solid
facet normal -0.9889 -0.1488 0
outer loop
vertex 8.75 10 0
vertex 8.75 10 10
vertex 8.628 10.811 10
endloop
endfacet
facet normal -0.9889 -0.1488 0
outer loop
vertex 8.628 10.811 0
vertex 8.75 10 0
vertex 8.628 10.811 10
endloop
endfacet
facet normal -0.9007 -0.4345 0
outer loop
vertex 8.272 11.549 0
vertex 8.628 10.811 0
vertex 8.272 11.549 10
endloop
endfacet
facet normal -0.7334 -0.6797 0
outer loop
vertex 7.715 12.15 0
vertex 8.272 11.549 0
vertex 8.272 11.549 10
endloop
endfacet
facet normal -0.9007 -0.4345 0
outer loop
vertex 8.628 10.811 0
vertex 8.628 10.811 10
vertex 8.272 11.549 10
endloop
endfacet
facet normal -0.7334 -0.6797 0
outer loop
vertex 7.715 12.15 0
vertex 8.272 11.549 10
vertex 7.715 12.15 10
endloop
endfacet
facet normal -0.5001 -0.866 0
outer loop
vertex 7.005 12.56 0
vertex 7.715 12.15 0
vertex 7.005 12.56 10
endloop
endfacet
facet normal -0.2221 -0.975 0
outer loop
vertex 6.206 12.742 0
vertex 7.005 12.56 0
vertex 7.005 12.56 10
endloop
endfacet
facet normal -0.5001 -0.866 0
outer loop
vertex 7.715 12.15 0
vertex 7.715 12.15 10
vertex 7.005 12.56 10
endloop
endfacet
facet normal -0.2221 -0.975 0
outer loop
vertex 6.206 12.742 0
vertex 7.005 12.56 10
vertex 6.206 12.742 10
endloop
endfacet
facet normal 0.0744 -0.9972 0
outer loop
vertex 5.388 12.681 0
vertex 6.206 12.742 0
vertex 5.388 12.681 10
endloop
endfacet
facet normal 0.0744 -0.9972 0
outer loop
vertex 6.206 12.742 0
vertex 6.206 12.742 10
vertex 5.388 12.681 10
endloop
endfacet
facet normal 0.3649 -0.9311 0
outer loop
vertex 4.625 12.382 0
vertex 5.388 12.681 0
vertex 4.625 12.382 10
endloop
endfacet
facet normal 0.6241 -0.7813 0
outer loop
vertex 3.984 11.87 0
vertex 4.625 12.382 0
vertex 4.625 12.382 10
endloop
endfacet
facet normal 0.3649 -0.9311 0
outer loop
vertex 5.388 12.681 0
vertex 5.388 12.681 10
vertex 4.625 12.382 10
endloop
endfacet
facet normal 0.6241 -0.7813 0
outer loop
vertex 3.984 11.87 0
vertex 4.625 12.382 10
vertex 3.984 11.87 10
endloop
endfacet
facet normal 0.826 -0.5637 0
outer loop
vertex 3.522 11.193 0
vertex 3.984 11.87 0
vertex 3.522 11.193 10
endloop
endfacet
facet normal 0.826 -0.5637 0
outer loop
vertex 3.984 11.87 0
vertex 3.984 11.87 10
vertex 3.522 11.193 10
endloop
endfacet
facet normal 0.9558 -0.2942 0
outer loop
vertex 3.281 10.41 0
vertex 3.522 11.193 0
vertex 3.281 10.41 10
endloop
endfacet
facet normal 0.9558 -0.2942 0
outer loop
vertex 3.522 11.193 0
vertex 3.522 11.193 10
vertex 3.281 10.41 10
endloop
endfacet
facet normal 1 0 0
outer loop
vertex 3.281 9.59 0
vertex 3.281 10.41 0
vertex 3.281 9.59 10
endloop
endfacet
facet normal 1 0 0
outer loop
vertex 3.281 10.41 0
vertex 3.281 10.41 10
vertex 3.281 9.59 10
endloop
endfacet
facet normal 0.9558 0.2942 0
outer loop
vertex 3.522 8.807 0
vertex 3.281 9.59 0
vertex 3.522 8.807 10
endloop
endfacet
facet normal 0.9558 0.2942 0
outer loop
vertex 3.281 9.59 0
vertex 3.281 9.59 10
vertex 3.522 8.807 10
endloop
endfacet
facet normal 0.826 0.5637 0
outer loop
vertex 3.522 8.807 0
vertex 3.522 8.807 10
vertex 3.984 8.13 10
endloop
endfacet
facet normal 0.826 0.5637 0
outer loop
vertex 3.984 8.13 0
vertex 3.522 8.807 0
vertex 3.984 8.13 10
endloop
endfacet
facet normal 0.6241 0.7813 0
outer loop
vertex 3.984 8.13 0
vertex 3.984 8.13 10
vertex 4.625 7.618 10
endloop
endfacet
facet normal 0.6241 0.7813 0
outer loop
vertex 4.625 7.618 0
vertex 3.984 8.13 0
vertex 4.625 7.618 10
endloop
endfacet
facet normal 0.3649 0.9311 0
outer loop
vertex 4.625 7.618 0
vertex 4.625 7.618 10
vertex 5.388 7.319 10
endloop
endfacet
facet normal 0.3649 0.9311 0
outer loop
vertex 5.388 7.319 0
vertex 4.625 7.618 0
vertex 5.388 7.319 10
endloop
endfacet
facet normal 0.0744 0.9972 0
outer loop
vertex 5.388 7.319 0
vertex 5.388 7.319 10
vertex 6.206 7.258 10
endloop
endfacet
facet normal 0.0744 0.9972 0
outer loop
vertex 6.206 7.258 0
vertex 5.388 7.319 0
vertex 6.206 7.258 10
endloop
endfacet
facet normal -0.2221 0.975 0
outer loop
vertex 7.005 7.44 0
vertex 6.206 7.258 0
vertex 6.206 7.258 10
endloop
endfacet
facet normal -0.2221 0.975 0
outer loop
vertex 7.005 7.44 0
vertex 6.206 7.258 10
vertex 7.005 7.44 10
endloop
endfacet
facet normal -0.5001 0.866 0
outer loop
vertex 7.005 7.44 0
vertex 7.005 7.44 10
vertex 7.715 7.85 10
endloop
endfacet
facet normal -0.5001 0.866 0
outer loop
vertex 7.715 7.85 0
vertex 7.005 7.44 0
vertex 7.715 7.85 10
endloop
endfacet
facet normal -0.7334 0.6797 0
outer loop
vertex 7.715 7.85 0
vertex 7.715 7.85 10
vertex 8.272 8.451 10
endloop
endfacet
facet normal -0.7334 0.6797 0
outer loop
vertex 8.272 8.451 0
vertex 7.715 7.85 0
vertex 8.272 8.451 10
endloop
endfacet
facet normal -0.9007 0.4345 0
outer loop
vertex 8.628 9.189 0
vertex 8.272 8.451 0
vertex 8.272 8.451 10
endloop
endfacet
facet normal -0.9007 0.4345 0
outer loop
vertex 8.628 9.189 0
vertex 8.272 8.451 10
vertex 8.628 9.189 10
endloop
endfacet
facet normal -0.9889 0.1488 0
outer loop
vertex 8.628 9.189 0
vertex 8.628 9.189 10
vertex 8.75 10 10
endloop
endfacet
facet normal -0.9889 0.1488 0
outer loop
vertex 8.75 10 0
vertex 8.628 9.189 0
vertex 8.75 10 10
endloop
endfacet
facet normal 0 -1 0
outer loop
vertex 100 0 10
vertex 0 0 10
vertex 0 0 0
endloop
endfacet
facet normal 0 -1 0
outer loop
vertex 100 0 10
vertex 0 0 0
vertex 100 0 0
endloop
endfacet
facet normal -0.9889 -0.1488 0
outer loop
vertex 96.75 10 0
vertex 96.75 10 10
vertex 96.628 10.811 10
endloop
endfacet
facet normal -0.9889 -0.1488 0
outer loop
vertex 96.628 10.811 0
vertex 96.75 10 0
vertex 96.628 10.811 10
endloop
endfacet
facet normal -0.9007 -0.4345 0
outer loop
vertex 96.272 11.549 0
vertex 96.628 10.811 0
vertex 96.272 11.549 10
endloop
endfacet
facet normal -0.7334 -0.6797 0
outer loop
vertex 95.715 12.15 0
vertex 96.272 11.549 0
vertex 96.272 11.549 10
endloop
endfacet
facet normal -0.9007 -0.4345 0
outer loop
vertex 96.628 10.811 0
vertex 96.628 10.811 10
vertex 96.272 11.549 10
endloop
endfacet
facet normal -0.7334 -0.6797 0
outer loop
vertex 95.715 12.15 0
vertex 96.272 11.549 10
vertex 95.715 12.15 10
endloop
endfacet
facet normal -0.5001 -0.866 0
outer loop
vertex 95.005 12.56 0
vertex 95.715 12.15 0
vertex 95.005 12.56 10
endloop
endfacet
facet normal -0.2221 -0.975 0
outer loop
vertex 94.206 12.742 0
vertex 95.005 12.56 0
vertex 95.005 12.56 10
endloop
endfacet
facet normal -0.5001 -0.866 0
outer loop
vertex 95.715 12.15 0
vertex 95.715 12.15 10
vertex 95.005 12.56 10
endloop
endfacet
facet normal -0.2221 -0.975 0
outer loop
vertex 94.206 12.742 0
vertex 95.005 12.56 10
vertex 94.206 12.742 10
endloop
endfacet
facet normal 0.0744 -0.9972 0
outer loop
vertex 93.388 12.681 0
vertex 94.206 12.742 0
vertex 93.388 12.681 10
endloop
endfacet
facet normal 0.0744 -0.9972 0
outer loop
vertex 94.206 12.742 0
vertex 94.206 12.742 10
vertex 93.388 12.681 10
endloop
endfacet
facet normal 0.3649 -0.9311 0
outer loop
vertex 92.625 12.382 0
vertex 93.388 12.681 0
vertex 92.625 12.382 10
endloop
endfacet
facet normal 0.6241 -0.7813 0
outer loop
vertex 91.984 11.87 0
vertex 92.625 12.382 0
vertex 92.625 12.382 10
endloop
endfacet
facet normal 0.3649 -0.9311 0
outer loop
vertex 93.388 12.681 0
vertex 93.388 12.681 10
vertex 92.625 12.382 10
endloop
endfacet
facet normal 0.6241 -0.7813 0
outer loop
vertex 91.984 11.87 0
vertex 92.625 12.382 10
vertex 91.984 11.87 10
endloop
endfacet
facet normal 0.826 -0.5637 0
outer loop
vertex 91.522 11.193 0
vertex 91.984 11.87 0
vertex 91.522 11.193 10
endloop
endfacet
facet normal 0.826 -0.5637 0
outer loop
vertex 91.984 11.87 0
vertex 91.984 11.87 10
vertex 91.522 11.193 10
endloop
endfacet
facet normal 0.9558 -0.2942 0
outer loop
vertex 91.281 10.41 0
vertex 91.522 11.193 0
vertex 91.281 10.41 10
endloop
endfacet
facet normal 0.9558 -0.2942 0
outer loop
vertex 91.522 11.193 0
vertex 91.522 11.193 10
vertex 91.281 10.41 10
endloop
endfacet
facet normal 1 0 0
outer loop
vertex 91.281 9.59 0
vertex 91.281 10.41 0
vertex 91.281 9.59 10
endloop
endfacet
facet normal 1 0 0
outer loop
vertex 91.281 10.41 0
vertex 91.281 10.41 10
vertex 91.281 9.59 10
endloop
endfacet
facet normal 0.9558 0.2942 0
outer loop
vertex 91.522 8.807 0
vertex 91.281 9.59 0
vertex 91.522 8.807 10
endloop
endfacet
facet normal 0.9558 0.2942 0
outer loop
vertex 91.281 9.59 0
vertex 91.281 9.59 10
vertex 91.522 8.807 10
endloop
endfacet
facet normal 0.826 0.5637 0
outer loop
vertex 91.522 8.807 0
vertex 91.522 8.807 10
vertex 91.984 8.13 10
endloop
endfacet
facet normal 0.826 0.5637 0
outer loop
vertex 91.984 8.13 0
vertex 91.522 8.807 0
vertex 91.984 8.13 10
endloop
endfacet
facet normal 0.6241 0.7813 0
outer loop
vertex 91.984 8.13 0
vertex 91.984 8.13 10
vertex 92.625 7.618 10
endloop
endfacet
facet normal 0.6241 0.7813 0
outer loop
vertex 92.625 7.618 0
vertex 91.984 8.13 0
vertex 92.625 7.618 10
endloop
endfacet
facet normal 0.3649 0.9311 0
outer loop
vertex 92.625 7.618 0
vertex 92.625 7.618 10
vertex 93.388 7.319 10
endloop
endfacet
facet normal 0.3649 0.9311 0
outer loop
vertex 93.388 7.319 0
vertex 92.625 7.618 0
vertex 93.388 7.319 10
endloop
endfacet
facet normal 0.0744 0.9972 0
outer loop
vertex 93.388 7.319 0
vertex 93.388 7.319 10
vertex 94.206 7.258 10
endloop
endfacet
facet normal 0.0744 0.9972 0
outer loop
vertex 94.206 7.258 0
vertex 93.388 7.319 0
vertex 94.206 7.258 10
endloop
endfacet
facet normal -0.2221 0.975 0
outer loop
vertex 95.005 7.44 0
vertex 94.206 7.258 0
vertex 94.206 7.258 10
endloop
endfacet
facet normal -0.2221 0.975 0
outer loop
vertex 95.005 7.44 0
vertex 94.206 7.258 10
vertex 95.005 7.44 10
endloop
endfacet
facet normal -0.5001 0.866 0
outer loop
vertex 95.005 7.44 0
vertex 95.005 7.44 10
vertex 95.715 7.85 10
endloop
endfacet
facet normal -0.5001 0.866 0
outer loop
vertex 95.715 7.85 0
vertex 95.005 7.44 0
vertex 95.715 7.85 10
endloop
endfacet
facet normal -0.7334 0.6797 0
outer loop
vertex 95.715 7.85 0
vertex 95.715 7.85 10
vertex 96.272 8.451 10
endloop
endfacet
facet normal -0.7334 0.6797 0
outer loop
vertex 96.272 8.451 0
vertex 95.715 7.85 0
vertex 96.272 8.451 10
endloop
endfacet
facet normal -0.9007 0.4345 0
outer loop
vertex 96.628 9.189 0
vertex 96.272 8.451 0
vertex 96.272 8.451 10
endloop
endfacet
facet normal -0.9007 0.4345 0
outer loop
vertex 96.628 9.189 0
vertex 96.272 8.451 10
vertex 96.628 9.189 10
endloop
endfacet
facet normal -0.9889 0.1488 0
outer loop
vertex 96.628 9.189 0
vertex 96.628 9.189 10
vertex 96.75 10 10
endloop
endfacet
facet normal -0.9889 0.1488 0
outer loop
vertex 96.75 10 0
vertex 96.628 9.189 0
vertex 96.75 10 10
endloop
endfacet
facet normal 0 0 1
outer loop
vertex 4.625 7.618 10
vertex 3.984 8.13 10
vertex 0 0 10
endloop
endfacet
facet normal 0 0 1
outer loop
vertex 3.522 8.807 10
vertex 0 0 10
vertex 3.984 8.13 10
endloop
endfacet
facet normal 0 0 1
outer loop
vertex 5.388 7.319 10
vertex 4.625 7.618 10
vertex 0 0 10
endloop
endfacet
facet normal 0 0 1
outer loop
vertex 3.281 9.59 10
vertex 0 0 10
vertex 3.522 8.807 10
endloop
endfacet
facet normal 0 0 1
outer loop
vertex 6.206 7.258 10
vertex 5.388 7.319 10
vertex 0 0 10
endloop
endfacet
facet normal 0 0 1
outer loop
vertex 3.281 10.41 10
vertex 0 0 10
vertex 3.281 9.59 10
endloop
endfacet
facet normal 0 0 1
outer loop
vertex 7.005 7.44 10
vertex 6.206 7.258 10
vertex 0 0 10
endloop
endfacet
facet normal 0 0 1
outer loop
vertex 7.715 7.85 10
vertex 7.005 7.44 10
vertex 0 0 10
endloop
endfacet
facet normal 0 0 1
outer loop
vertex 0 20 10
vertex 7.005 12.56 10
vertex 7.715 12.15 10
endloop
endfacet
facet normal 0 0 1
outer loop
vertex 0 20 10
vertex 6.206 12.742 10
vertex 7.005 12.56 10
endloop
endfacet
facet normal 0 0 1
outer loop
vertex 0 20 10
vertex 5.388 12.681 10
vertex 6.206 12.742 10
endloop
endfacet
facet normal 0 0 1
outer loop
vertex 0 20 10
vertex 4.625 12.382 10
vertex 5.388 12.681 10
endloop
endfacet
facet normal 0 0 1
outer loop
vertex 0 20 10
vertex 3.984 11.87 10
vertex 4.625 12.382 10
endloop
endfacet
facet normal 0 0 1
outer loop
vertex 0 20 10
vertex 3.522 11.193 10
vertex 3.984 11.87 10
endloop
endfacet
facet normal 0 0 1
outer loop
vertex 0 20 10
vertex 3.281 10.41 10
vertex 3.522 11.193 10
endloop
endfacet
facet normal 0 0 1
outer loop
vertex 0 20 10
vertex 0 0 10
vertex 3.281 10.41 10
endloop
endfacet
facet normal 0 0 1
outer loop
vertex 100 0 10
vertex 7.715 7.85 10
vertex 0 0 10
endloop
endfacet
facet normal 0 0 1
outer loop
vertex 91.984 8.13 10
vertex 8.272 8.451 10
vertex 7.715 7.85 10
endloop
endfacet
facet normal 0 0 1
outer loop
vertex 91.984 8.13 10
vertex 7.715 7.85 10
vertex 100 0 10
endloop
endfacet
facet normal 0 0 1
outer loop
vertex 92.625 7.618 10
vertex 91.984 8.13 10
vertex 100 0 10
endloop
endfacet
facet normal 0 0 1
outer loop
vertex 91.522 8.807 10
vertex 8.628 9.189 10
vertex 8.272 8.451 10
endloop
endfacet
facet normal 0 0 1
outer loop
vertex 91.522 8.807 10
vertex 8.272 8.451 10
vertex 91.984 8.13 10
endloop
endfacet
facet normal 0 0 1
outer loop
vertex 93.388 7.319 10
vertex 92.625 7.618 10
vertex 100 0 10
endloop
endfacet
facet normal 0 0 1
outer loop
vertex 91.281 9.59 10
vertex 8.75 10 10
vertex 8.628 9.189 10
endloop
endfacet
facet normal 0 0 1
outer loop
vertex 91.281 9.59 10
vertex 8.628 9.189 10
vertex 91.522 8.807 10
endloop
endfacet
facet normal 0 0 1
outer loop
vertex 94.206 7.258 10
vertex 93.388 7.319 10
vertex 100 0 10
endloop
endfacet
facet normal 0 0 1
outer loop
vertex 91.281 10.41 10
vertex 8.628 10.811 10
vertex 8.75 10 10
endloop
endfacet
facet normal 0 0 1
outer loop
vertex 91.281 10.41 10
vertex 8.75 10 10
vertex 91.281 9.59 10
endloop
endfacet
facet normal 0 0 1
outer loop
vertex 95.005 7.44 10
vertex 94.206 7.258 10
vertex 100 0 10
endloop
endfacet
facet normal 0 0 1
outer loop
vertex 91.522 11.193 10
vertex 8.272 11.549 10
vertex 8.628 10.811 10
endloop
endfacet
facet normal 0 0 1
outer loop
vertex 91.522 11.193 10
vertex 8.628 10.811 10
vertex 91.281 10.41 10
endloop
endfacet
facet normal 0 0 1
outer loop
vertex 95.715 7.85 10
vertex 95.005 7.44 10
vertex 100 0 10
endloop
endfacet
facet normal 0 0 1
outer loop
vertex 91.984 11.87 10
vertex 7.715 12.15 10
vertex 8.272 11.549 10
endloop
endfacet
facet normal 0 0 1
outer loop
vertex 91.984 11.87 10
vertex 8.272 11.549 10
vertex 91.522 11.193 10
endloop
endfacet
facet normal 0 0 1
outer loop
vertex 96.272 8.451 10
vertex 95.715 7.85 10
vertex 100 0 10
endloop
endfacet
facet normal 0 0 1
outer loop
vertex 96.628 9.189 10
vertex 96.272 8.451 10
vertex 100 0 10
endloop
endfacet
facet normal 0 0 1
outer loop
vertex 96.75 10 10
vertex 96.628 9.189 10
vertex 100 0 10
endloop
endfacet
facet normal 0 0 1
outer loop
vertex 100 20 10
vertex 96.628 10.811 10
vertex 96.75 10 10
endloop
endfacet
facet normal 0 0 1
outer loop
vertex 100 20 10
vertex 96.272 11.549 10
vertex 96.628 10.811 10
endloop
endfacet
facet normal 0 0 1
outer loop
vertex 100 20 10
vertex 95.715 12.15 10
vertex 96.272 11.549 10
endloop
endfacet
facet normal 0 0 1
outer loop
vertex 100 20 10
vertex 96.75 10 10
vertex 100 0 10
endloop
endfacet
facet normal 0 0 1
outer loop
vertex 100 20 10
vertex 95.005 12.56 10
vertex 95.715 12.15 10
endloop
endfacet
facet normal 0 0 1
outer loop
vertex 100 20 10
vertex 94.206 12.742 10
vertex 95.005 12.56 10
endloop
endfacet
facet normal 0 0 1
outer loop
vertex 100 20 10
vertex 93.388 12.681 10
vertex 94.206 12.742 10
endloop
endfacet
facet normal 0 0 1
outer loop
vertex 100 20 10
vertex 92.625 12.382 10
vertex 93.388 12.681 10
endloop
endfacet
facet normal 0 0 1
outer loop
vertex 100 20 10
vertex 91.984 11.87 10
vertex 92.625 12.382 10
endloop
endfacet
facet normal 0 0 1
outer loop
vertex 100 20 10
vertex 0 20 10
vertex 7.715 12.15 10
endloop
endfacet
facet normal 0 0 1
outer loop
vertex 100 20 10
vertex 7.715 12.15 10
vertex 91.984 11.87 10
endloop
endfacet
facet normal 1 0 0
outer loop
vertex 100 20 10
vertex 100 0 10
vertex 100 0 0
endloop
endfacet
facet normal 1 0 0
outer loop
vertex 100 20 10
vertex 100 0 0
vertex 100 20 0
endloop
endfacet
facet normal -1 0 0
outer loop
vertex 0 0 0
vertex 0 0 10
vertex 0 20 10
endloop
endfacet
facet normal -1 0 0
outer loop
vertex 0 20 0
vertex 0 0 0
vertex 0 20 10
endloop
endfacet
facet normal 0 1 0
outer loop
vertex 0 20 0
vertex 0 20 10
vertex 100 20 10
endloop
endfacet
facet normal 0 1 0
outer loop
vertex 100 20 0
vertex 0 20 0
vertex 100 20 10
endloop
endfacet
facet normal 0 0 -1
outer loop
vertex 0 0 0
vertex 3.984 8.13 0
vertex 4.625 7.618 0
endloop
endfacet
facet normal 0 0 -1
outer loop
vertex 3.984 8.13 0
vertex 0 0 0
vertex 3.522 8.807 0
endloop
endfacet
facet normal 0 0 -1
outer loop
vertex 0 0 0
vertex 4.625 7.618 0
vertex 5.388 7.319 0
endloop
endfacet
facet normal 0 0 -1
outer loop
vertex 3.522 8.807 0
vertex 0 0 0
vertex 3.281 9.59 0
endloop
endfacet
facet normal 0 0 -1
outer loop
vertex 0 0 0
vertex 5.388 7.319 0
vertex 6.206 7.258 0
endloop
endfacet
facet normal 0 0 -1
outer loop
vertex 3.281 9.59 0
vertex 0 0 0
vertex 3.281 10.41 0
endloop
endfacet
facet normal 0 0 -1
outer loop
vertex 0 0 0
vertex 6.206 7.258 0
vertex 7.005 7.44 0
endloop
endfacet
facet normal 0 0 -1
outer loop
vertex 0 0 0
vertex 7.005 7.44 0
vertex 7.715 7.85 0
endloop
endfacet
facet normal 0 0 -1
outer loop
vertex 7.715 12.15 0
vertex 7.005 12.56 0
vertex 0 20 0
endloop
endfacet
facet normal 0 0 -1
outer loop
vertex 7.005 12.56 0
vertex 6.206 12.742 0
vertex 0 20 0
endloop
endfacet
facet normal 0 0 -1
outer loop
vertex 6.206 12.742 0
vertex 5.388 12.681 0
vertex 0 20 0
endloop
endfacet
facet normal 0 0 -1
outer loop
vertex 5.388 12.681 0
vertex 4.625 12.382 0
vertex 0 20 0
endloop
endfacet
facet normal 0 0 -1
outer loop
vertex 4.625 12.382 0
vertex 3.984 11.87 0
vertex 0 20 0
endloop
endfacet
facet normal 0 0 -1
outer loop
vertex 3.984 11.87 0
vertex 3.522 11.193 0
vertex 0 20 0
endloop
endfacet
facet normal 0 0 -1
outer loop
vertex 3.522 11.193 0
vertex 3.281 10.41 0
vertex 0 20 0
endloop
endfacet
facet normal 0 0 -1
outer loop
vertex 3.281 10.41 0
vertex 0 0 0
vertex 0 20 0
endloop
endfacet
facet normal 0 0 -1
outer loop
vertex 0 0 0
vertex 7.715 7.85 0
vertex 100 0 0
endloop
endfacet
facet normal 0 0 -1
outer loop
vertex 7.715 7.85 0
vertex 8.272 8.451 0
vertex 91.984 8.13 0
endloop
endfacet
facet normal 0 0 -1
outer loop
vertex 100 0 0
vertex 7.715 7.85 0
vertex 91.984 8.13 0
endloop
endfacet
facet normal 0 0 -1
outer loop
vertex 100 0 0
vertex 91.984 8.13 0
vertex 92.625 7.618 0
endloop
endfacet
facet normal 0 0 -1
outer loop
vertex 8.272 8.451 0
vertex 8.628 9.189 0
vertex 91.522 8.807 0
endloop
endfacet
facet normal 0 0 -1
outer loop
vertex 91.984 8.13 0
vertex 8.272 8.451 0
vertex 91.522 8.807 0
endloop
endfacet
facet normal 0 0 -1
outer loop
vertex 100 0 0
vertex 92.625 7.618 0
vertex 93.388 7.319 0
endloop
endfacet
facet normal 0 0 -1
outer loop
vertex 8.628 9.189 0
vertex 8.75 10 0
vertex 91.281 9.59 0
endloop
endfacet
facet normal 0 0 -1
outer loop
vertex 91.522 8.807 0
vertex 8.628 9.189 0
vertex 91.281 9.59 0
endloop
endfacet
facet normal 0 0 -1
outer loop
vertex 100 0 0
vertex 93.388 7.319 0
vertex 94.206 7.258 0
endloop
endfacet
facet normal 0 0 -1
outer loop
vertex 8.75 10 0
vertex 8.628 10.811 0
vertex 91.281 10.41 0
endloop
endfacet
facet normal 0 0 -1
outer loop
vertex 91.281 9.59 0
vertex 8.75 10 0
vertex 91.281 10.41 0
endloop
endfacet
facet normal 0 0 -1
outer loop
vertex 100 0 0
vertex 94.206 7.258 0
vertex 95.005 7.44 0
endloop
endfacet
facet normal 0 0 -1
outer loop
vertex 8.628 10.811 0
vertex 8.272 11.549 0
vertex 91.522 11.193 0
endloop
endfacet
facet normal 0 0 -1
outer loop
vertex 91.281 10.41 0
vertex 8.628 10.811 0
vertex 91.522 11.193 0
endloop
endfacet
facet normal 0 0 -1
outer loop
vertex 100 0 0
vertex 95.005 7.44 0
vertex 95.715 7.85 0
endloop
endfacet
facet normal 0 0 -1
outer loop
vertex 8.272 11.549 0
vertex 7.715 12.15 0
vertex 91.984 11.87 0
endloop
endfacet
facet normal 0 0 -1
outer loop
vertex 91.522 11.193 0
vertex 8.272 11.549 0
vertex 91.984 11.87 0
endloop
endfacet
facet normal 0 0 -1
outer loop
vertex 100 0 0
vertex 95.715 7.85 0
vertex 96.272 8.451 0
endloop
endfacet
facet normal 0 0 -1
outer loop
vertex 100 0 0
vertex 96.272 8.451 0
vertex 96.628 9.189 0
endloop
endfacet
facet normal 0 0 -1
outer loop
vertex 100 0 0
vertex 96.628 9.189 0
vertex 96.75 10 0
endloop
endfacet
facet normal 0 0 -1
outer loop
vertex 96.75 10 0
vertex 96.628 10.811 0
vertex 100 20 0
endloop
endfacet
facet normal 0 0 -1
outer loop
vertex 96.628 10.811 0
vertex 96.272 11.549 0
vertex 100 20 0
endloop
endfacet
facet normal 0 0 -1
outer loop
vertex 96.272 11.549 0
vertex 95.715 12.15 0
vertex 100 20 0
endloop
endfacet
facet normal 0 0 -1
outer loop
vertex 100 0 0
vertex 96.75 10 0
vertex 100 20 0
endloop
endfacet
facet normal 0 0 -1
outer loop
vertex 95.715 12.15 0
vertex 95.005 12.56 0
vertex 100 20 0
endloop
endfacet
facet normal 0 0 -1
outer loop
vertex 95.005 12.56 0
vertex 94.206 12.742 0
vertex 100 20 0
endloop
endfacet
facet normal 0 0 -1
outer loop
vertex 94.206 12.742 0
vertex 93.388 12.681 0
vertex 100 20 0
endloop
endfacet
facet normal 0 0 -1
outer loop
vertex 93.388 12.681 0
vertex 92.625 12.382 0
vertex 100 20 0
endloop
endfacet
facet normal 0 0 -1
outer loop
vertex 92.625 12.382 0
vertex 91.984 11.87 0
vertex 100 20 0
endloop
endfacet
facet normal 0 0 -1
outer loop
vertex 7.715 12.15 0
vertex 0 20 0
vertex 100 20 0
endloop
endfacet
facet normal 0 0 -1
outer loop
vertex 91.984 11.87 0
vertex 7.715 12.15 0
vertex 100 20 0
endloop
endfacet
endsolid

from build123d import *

# Parameters (mm, degrees)
SKETCH1_W           = 100
SKETCH1_H           = 20
BOSS_EXTRUDE1_DEPTH = 10
SKETCH2_R           = 2.75
CUT_EXTRUDE1_DEPTH  = 11


with BuildPart() as part:
    # Sketch1 → Boss-Extrude1 (new body)
    with BuildSketch(Plane.XY.offset(10)):
        with Locations((50, 10)):
            Rectangle(SKETCH1_W, SKETCH1_H)
    extrude(amount=-BOSS_EXTRUDE1_DEPTH)

    # Sketch2 → Cut-Extrude1 (cut, through all)
    with BuildSketch(Plane.XY.offset(10)):
        with Locations((94, 10)):
            Circle(SKETCH2_R)
        with Locations((6, 10)):
            Circle(SKETCH2_R)
    extrude(amount=-CUT_EXTRUDE1_DEPTH, mode=Mode.SUBTRACT)


solid = part.part
